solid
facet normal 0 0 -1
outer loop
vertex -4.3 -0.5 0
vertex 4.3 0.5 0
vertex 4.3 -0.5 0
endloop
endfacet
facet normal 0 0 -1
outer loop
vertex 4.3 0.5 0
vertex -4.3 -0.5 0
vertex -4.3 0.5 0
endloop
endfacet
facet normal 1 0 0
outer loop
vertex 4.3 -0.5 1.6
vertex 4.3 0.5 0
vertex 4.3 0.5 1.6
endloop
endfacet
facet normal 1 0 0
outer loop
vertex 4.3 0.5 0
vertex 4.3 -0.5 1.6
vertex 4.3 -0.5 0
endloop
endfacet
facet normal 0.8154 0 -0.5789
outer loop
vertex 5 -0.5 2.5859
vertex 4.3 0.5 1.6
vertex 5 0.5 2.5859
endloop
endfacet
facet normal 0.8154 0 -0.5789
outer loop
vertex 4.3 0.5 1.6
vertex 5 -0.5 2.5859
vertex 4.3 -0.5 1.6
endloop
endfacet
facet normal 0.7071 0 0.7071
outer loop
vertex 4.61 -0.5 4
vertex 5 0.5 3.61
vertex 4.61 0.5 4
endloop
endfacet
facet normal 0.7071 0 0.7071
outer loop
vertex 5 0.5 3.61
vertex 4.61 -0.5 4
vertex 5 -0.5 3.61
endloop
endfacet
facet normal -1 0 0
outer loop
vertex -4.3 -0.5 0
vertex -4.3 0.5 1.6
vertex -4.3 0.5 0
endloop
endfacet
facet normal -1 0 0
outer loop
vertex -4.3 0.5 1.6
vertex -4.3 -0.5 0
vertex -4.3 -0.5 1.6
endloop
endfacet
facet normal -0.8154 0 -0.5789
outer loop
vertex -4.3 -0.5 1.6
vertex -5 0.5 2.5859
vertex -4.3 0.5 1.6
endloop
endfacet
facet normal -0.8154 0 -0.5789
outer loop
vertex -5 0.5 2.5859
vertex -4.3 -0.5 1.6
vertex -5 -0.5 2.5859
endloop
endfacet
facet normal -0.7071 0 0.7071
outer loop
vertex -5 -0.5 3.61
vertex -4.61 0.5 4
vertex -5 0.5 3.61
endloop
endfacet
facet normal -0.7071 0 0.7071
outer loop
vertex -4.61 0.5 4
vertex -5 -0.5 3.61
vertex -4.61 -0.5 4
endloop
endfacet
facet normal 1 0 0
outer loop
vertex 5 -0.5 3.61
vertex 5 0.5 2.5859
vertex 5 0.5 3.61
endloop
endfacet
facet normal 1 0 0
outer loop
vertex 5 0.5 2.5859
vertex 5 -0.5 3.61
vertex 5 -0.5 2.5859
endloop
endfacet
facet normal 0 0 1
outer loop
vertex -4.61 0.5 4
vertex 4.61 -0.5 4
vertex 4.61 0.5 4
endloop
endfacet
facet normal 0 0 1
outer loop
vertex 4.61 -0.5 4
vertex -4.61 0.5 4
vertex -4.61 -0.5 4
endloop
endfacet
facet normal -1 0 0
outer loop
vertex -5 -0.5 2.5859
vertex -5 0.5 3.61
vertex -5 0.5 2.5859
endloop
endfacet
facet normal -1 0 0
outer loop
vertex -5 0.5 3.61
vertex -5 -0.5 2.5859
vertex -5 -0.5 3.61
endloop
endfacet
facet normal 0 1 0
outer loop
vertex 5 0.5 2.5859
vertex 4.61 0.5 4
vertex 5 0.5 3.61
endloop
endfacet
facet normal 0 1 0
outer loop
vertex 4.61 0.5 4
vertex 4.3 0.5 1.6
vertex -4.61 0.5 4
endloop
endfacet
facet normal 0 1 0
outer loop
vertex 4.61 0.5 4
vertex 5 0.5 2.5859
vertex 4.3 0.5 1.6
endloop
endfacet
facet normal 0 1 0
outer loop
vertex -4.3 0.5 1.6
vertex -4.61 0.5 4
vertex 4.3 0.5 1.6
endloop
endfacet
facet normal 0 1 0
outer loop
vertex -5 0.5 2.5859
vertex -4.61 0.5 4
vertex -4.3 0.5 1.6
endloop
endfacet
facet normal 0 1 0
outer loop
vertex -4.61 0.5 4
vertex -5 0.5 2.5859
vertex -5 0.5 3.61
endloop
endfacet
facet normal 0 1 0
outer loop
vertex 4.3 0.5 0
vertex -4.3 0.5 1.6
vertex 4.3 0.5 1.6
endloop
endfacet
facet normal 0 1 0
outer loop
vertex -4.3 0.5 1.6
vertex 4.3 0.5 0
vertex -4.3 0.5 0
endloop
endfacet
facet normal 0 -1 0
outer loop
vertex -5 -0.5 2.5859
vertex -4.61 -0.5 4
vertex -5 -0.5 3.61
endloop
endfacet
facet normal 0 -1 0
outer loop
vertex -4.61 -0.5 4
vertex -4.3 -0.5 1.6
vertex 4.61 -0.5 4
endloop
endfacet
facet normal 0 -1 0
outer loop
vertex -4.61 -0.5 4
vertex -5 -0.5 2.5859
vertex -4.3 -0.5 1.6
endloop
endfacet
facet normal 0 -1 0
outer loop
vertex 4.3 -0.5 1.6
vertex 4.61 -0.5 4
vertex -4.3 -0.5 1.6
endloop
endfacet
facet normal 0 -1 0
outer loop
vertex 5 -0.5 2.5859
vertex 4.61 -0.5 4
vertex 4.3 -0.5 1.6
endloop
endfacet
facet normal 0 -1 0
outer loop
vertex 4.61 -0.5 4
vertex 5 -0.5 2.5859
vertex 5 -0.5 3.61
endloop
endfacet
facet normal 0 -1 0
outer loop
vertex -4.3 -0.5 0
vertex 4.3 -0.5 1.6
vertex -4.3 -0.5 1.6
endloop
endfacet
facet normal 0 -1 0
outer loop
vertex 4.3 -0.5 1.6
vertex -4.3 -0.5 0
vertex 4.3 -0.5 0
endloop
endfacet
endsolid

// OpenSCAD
// file: ../lib/BOSL2/std.scad
// Minimal BOSL2 compatibility shim for bundled gallery models.
// It implements only the helpers used by the imported OpenSCAD projects.

CENTER = [0, 0, 0];
BOTTOM = [0, 0, -1];
TOP = [0, 0, 1];
LEFT = [-1, 0, 0];
RIGHT = [1, 0, 0];
FRONT = [0, -1, 0];
BACK = [0, 1, 0];

module up(z=0) {
    translate([0, 0, z]) children();
}

module down(z=0) {
    translate([0, 0, -z]) children();
}

module attach(anchor=CENTER) {
    children();
}

module cuboid(size=[1, 1, 1], anchor=CENTER) {
    center = anchor == CENTER;
    translate(center ? [0, 0, 0] : [0, 0, size[2] / 2])
        cube(size, center=true);
    children();
}

module xcyl(h=1, r=1, anchor=CENTER) {
    center = anchor == CENTER;
    translate(center ? [0, 0, 0] : [h / 2, 0, 0])
        rotate([0, 90, 0])
            cylinder(h=h, r=r, center=true);
}
// main file
include <../lib/node_interface.scad>
node_receiver_retention_profile(0);
